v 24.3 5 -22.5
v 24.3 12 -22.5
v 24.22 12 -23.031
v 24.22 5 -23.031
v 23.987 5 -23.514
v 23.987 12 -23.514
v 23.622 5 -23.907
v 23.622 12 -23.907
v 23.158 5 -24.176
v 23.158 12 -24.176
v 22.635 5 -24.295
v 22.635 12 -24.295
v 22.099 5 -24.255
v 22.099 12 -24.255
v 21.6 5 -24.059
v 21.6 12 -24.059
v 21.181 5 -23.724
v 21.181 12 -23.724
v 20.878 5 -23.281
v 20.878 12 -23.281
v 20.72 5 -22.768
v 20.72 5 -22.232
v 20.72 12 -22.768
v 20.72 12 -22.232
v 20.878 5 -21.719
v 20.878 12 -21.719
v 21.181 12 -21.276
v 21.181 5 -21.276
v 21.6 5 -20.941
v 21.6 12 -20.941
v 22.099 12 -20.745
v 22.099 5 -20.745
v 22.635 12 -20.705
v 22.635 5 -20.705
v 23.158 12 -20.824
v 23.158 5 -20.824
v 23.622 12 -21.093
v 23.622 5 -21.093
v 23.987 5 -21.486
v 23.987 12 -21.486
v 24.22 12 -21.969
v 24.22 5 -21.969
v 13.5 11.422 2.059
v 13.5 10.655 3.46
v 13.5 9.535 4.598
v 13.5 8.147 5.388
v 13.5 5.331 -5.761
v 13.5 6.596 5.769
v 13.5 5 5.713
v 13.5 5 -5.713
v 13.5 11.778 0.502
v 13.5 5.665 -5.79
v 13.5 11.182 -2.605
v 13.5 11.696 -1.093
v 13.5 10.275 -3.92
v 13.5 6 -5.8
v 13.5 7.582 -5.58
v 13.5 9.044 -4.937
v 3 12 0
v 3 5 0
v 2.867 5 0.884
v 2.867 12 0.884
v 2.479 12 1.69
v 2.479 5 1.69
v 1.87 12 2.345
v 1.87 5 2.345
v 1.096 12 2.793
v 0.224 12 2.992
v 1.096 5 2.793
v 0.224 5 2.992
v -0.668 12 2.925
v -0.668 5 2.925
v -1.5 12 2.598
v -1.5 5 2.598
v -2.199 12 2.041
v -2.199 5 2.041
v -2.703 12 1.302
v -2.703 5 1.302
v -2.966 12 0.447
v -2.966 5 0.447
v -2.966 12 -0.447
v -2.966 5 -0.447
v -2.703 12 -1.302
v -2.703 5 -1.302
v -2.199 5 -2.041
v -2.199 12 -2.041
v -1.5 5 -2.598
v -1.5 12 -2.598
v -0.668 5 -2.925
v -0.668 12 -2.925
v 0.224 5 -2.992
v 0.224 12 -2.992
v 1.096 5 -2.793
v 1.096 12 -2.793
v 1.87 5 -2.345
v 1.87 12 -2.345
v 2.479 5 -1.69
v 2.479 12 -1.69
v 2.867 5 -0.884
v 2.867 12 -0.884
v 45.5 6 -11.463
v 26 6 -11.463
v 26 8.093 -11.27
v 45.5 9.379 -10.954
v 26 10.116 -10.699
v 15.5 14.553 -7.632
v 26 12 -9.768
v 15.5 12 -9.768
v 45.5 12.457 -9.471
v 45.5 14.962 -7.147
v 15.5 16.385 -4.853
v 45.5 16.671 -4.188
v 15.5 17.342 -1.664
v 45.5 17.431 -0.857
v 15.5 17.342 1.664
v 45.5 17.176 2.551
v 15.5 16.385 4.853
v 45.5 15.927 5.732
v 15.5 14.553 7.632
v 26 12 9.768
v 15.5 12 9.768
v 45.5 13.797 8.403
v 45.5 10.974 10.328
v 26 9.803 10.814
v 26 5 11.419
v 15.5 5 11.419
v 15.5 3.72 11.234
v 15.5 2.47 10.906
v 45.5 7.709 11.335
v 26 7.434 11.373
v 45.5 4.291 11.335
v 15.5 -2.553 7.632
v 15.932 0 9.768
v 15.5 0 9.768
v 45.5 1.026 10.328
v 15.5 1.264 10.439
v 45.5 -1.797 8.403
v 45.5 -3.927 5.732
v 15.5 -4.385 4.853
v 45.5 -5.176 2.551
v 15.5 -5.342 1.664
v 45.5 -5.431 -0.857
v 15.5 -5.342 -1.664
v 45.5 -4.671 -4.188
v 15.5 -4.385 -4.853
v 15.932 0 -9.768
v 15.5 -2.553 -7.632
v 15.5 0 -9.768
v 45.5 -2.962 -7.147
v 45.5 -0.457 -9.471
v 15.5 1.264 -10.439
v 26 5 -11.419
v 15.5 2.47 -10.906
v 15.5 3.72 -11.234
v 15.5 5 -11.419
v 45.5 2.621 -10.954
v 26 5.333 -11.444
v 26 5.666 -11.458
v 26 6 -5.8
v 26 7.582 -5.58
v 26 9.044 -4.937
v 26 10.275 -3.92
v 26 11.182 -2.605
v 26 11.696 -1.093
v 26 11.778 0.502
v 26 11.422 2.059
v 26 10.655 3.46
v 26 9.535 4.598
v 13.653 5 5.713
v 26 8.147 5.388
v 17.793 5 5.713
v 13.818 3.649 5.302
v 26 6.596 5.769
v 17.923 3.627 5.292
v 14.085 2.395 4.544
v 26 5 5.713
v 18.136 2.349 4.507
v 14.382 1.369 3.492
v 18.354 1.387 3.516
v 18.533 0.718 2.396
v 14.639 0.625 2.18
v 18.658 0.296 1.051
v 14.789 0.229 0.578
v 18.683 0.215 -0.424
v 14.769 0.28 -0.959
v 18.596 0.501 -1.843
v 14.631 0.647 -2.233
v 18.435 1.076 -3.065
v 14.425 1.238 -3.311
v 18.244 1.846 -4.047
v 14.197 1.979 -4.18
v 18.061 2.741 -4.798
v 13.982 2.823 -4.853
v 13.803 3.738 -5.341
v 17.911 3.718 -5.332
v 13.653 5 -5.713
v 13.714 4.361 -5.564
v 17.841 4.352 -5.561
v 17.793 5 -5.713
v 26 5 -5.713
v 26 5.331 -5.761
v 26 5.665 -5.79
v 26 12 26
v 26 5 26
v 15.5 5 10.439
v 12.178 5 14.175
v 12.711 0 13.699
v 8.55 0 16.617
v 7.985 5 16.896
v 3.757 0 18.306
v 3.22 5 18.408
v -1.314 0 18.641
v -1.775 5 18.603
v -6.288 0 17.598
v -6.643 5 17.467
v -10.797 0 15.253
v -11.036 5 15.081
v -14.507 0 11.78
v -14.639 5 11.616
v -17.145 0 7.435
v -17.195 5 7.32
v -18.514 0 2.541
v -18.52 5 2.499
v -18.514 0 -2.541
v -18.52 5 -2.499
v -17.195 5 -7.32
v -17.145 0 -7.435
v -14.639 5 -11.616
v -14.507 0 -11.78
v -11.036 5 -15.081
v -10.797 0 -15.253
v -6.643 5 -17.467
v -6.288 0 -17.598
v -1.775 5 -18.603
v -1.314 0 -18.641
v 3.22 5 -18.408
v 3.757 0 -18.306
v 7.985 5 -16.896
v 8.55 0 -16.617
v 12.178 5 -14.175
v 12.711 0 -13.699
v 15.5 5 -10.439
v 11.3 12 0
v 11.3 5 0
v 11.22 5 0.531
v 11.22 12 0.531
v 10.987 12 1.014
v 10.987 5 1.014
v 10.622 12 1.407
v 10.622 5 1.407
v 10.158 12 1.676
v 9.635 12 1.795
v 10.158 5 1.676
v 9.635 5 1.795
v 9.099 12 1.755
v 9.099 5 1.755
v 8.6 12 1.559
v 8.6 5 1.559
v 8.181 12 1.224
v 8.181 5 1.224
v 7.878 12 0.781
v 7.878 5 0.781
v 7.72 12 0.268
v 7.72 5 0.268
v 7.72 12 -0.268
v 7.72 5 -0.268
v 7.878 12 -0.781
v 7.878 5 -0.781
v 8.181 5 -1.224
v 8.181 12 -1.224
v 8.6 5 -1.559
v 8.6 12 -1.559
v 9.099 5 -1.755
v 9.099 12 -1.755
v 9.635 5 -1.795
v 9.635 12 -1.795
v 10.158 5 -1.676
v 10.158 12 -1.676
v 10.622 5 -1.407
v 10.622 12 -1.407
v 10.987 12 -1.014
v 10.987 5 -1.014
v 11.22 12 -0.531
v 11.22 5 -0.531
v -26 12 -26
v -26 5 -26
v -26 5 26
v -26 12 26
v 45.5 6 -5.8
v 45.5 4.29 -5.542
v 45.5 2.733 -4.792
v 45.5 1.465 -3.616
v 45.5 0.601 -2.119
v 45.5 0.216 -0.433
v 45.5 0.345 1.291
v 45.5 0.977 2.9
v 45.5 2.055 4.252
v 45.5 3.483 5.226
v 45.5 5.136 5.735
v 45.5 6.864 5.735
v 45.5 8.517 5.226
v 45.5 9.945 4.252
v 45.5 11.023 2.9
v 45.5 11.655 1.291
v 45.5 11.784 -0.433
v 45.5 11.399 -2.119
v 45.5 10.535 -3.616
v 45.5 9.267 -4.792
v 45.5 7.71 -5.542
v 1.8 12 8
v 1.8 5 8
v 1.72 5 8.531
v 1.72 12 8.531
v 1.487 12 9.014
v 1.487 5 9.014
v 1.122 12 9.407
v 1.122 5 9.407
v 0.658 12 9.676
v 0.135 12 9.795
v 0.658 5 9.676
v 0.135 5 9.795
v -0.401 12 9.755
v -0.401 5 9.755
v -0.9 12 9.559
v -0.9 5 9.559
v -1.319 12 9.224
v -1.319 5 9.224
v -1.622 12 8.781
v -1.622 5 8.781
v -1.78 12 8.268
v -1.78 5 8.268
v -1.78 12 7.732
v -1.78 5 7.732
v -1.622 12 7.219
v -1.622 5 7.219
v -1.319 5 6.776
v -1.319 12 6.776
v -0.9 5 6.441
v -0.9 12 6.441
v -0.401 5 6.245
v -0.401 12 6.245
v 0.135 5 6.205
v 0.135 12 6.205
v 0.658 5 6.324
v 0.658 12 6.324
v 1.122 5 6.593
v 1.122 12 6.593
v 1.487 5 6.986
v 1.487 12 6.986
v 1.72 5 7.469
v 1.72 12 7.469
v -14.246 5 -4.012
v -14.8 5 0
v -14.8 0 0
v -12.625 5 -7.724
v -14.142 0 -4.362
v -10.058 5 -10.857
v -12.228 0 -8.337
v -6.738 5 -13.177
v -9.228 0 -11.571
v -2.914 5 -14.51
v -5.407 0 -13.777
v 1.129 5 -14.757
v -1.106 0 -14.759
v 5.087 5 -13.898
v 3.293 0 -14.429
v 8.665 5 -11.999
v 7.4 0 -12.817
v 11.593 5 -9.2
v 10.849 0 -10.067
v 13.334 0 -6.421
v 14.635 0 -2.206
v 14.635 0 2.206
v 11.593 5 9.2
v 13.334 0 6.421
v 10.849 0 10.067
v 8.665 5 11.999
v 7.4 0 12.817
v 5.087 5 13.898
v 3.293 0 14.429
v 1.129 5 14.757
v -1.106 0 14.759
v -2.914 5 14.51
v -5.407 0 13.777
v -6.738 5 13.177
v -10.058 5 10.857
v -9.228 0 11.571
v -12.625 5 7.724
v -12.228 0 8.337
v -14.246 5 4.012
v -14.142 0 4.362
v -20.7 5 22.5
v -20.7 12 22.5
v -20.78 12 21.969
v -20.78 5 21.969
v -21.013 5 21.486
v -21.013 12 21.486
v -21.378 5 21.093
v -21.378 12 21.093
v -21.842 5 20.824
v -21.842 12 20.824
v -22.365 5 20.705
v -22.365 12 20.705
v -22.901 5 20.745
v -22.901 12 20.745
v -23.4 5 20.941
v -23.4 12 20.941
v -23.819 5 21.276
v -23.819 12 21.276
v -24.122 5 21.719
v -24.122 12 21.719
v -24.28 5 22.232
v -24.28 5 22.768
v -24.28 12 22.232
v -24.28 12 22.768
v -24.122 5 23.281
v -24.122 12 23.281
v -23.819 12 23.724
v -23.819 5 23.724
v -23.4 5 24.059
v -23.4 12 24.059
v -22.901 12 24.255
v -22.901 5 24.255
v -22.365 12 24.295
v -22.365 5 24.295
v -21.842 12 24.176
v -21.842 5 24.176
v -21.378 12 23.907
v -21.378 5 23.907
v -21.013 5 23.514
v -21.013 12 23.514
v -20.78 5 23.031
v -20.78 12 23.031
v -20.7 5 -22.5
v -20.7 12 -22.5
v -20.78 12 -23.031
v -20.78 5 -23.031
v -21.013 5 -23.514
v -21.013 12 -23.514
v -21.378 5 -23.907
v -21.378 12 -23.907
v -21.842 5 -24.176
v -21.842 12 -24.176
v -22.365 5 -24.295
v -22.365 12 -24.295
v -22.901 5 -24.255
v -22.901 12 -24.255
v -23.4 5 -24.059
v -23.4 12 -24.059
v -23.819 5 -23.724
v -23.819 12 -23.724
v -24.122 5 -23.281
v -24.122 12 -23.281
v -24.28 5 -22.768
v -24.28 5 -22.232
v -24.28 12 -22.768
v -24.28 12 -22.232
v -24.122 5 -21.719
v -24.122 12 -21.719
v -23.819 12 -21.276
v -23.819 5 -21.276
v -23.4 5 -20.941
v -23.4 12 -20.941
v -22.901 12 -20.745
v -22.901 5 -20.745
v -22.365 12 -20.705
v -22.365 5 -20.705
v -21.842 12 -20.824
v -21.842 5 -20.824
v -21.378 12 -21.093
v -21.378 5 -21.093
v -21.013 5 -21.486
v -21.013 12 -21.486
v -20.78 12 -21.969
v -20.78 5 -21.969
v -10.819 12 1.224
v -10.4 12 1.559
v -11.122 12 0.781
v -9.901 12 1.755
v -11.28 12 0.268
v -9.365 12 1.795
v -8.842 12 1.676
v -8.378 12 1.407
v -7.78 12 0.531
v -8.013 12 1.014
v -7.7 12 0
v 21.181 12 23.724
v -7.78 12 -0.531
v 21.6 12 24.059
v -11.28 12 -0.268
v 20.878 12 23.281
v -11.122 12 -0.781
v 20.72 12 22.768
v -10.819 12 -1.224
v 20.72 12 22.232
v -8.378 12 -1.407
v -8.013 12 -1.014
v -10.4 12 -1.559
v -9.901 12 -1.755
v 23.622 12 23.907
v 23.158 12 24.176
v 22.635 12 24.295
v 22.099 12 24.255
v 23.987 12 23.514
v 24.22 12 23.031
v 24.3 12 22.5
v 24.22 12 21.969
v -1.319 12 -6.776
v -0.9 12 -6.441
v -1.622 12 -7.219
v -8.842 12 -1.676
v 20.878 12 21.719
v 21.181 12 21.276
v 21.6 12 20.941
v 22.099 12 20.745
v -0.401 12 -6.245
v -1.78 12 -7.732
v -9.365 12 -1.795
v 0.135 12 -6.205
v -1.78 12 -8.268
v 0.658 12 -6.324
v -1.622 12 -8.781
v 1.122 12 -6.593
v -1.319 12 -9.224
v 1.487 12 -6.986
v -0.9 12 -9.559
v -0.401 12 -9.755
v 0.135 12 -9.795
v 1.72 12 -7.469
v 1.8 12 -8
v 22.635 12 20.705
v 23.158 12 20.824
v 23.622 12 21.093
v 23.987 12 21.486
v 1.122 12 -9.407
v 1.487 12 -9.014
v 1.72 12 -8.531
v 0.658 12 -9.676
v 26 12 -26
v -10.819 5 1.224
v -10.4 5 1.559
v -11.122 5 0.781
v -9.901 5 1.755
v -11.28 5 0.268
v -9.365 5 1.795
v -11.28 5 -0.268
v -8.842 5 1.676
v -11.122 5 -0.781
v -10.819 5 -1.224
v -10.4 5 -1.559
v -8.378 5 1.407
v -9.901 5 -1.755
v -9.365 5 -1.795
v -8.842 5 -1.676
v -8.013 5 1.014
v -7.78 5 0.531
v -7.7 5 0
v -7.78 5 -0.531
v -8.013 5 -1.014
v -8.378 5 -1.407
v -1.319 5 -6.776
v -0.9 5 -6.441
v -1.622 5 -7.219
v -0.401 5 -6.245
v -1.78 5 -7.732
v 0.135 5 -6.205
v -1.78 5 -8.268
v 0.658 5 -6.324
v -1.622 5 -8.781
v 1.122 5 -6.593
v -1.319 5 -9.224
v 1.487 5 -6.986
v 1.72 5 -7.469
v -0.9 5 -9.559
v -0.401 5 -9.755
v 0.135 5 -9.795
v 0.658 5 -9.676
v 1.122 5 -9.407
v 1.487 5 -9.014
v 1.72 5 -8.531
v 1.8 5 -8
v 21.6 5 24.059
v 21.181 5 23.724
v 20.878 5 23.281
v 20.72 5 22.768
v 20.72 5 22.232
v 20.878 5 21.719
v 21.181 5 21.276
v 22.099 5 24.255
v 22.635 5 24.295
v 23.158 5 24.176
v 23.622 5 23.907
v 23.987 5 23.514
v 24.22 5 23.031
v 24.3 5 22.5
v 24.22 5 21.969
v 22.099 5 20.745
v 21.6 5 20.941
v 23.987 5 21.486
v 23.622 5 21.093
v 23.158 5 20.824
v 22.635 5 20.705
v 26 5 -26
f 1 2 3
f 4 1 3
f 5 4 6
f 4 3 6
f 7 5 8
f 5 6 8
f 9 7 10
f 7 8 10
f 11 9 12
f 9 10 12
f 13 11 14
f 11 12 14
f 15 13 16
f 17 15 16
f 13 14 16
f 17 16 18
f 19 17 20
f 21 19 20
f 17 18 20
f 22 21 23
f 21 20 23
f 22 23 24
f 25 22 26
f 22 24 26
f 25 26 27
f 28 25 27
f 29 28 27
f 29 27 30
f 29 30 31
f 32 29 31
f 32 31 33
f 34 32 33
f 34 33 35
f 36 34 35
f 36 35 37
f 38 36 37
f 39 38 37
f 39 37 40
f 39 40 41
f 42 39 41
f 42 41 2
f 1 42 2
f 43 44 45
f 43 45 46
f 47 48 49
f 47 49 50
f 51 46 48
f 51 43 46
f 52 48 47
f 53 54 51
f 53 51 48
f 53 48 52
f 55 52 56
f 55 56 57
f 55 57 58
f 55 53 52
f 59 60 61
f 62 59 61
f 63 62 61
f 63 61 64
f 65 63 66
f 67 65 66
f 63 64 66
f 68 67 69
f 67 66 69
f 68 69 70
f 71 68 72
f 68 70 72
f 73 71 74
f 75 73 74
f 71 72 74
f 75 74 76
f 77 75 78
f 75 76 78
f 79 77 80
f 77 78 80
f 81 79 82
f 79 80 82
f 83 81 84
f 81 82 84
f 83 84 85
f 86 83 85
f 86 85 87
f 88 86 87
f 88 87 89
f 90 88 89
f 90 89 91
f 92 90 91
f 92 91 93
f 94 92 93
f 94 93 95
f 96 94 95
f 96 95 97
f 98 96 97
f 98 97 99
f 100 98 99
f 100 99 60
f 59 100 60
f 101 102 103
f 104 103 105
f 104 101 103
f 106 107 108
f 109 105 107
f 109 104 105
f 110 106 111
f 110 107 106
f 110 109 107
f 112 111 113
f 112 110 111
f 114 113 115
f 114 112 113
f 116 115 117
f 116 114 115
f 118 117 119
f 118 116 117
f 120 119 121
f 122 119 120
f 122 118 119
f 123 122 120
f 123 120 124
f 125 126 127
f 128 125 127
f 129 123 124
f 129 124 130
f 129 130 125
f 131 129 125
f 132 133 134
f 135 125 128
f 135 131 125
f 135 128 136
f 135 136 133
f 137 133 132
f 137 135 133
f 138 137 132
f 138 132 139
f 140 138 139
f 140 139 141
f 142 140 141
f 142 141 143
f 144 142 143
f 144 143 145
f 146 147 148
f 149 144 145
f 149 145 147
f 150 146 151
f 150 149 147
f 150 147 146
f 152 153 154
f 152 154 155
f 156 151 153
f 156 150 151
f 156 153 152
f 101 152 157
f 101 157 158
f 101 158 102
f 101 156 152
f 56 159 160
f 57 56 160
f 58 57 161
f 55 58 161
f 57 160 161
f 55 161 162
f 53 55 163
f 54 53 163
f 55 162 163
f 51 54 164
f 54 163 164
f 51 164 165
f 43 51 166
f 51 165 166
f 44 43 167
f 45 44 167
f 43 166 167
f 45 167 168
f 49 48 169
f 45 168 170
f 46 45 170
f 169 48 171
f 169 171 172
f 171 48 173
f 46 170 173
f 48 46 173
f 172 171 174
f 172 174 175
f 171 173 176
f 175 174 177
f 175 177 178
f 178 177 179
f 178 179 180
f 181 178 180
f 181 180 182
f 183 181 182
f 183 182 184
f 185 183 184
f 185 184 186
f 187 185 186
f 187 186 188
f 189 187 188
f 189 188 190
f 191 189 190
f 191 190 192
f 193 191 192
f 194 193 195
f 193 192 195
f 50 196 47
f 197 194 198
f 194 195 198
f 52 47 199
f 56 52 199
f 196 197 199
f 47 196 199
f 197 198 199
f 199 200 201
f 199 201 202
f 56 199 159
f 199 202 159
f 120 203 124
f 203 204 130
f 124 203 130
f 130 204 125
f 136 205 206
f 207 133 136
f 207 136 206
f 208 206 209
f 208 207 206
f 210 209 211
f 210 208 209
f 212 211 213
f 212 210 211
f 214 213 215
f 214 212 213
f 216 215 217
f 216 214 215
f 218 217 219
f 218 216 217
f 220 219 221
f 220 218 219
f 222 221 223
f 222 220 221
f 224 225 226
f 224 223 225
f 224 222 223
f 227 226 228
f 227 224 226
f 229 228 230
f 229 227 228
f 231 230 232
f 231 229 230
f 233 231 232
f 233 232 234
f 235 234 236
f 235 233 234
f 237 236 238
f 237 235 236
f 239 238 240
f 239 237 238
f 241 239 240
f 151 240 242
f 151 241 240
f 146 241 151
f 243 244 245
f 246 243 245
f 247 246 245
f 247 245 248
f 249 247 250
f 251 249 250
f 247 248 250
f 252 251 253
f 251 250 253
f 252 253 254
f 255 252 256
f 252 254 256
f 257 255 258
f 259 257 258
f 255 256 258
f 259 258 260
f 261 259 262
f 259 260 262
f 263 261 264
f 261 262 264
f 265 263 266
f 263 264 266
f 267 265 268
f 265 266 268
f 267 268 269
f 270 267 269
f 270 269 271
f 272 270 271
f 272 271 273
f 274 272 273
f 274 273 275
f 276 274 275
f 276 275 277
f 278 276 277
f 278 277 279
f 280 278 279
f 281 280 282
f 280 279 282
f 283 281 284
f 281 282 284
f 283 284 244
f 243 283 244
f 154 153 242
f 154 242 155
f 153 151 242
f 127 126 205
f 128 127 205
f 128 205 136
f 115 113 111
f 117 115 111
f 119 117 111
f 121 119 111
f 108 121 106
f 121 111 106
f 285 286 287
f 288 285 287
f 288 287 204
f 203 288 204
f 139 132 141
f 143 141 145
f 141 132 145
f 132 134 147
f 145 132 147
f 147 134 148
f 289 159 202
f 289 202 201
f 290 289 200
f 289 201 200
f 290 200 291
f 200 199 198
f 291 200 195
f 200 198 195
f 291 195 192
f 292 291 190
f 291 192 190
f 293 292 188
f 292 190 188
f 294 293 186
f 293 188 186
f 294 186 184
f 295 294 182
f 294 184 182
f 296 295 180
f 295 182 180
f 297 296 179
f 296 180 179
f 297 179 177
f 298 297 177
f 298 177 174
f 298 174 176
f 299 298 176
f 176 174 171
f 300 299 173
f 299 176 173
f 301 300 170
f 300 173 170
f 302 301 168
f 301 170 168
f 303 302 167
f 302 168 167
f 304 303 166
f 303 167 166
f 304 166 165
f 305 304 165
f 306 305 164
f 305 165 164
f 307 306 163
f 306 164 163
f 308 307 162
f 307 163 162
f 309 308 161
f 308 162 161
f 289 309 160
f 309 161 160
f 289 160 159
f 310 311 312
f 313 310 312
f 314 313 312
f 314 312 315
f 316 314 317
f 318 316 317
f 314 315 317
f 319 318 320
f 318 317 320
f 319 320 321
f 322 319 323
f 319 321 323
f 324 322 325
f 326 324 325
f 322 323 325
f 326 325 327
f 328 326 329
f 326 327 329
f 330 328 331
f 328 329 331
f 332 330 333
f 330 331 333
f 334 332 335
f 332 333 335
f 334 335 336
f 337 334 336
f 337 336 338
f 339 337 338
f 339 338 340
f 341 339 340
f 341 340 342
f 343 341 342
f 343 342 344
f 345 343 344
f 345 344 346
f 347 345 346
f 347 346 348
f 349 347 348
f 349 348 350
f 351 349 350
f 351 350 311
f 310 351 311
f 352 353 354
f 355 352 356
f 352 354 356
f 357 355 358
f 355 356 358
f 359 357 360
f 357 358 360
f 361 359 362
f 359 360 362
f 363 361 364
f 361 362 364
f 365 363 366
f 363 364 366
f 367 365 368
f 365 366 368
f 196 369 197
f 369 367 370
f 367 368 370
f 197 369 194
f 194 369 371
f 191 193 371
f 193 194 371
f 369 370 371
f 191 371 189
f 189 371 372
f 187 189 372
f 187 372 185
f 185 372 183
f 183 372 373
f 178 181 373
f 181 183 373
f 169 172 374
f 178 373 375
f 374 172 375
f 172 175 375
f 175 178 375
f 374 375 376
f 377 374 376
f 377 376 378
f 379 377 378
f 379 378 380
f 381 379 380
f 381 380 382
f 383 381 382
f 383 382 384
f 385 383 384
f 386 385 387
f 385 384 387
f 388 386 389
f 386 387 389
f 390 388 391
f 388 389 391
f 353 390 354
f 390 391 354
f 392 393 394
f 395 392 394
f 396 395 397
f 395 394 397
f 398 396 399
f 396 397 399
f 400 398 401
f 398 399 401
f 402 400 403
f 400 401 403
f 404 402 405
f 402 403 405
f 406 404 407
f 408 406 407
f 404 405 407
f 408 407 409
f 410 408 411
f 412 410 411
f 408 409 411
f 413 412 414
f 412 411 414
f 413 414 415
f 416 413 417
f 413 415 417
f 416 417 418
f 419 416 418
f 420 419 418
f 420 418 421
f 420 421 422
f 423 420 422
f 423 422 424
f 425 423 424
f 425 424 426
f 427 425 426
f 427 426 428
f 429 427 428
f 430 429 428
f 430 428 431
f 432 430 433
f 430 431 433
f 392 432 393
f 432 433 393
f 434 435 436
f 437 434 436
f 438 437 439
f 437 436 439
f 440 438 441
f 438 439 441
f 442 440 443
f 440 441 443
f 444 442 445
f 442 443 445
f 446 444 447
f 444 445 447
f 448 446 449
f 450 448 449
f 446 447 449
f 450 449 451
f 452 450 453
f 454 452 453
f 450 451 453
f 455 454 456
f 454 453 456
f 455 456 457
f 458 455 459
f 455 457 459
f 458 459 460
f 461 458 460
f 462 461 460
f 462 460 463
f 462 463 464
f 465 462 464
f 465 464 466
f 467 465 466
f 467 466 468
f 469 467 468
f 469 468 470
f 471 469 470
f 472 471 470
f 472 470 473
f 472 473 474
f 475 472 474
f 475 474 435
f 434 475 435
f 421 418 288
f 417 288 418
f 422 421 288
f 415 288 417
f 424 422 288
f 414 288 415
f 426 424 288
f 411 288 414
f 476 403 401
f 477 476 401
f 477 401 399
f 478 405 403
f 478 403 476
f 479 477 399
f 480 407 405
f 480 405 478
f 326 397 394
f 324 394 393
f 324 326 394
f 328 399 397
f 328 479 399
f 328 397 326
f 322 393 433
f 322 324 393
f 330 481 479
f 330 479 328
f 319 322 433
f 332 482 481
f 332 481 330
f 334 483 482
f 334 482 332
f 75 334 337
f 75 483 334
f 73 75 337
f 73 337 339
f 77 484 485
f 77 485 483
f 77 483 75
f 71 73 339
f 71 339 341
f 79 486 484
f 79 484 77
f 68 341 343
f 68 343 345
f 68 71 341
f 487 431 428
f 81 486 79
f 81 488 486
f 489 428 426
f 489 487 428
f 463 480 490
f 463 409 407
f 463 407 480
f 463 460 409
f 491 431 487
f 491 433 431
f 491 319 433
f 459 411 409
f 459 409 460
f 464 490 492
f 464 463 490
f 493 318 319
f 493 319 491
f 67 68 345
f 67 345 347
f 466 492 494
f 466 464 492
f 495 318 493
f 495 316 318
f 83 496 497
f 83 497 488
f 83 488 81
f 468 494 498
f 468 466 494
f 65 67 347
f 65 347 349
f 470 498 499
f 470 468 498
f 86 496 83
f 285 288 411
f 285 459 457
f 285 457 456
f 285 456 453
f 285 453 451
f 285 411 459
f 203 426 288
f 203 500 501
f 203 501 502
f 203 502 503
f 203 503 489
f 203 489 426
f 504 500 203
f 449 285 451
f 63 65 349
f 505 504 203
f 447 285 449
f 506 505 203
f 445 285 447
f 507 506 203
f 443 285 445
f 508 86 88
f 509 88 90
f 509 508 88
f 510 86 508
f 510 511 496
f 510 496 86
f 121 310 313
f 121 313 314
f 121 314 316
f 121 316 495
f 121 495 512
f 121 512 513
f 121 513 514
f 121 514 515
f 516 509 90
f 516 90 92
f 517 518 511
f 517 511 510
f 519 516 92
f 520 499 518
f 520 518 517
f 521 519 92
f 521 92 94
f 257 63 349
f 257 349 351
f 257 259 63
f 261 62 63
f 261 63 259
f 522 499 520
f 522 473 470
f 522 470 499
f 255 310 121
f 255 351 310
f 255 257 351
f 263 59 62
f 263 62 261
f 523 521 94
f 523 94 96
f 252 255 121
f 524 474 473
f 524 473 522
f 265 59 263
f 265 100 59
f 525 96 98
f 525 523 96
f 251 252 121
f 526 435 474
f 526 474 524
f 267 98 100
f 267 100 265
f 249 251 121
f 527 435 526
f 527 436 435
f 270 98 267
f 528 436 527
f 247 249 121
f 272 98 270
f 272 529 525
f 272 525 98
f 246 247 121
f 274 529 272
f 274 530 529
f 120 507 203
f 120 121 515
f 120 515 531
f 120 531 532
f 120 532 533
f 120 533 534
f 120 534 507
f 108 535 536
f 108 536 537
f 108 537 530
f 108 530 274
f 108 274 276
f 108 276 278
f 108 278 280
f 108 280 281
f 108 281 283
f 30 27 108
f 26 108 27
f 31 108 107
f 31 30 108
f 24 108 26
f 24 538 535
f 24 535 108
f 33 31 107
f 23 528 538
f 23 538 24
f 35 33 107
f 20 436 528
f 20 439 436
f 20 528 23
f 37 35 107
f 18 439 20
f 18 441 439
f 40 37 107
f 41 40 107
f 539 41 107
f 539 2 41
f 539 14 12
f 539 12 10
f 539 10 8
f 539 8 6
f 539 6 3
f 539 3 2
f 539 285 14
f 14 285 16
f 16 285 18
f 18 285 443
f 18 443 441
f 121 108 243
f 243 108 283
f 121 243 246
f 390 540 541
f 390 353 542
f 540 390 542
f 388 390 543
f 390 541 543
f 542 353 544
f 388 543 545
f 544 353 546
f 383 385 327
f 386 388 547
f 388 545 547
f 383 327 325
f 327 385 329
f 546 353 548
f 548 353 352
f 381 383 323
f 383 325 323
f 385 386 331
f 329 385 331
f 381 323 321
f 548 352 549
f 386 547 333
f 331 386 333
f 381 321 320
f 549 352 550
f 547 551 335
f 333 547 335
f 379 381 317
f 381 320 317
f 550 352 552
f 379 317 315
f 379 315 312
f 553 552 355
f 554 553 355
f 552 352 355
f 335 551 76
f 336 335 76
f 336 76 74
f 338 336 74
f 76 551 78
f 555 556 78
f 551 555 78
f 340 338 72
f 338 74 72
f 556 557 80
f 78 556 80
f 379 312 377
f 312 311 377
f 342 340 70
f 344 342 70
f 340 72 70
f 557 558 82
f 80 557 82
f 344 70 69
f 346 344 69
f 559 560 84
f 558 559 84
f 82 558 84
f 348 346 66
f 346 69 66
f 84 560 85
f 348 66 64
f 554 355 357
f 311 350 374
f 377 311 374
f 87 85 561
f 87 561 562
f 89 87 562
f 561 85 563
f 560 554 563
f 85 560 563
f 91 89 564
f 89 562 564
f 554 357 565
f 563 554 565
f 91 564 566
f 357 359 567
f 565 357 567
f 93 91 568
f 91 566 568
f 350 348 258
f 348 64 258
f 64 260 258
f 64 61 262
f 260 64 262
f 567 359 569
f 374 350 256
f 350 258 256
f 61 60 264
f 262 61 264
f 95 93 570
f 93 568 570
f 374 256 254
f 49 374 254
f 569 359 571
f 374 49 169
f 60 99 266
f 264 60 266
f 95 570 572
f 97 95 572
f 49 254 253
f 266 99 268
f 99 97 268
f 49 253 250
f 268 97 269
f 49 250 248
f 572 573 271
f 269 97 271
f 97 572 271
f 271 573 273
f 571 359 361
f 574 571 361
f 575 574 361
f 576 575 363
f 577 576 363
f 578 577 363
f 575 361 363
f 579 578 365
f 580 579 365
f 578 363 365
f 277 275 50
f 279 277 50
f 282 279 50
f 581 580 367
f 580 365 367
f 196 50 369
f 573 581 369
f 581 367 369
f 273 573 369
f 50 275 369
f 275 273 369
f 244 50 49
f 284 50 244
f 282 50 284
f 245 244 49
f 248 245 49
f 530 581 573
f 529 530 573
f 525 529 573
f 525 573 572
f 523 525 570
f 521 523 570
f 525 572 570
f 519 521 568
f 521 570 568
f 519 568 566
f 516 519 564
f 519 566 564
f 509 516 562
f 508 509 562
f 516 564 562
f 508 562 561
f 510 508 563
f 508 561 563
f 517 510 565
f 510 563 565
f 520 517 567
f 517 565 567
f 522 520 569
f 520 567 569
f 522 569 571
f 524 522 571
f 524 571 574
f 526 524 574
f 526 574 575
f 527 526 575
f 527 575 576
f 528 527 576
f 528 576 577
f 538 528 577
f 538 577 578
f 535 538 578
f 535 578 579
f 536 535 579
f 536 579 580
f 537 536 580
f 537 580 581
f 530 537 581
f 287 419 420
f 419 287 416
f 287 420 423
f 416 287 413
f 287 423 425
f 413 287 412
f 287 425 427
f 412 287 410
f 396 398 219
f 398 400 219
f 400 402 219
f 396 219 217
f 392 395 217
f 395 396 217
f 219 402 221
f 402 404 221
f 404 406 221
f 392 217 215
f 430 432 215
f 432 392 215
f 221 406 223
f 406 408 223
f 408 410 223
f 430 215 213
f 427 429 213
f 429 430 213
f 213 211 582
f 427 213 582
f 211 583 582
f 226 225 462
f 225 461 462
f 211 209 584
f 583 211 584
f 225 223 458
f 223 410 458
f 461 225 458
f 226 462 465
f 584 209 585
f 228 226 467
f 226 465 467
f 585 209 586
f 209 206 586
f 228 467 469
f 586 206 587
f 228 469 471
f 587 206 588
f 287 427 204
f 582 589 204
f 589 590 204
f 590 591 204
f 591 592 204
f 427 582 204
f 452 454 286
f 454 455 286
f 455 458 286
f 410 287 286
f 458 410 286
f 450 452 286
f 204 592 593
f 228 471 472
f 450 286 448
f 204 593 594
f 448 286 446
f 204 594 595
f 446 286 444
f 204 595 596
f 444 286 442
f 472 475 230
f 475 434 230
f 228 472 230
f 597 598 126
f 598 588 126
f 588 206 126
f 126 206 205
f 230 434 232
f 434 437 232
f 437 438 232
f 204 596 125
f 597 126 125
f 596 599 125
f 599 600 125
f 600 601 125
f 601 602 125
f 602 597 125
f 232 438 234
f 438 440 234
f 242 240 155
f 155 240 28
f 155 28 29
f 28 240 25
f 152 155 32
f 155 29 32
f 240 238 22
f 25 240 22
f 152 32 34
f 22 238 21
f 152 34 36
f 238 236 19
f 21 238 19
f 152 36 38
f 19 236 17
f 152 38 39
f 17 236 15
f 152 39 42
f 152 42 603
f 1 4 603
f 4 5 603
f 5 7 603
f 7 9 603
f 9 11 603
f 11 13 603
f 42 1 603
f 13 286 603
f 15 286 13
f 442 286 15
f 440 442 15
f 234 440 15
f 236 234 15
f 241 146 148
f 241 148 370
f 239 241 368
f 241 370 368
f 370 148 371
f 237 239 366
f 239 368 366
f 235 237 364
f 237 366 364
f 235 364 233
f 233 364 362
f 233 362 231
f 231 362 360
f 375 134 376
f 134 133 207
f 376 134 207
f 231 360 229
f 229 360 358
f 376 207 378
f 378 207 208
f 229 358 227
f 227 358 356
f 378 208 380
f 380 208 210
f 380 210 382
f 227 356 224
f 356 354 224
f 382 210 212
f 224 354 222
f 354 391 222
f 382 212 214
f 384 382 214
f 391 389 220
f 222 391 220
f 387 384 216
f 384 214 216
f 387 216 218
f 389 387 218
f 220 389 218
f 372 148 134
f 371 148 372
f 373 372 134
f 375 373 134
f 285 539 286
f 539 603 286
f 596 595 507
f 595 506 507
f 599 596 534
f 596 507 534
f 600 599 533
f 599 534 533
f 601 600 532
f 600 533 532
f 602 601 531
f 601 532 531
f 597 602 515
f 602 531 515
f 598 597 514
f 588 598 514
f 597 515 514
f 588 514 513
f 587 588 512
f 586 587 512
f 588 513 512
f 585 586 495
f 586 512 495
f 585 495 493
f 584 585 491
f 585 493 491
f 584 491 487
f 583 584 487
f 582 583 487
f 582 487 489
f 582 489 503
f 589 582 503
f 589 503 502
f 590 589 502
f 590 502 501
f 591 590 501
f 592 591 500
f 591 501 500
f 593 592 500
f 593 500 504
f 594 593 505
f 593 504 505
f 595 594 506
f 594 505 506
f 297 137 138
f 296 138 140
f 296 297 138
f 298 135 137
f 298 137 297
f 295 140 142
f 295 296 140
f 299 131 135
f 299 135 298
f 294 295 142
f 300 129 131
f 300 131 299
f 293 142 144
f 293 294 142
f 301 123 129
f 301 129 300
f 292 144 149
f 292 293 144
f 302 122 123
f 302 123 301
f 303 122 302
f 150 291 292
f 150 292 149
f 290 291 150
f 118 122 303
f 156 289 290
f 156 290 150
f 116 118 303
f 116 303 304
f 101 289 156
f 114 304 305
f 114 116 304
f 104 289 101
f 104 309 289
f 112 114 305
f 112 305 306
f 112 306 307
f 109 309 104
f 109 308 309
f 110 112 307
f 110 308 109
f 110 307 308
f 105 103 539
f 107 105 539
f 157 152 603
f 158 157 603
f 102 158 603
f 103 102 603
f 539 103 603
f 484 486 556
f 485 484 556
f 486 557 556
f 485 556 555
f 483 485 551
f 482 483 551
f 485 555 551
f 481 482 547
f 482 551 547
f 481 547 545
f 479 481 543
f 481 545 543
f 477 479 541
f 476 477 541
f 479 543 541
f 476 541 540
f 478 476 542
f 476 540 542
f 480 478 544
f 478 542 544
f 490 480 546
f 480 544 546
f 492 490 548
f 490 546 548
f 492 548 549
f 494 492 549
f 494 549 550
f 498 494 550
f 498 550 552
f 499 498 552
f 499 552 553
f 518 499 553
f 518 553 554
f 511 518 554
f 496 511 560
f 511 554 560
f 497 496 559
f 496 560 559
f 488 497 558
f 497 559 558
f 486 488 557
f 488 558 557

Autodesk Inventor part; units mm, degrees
ref_plane "YZ Plane" through (0, 0, 0) normal (1, 0, 0) x (0, 1, 0)
ref_plane "XZ Plane" through (0, 0, 0) normal (0, 1, 0) x (-1, 0, 0)
ref_plane "XY Plane" through (0, 0, 0) normal (0, 0, 1) x (1, 0, 0)
sketch "Sketch1" plane through (0, 0, 0) normal (0, 1, 0) x (-1, 0, 0)
  circle A0 centre (0, 0) radius 14.8
  circle A1 centre (0, 0) radius 18.6876
  dimension "d0" = 29.6
extrude "Extrusion1" add sketch "Sketch1" along normal blind 5
sketch "Sketch2" plane through (0, 5, 0) normal (0, 1, 0) x (1, 0, 0)
  line L0 (0, 0) -> (0, 26)
  line L1 (0, 26) -> (-26, 26)
  line L2 (-26, 26) -> (-26, -26)
  line L3 (-26, -26) -> (26, -26)
  line L4 (26, -26) -> (26, 26)
  line L5 (26, 26) -> (-26, 26)
  line L6 (-26, 26) -> (-26, -26)
  dimension "d3" = 26
  dimension "d4" = 26
  dimension "d5" = 52
  dimension "d6" = 52
extrude "Extrusion2" add sketch "Sketch2" along normal blind 7
sketch "Sketch3" plane through (0, 5, 0) normal (0, -1, 0) x (1, 0, 0)
  circle A0 centre (9.5, 0) radius 1.8
  circle A1 centre (-9.5, 0) radius 1.8
  circle A2 centre (0, -8) radius 1.8
  circle A3 centre (0, 8) radius 1.8
  circle A4 centre (0, 0) radius 3
  dimension "d11" = 3.6
  dimension "d12" = 3.6
  dimension "d13" = 3.6
  dimension "d14" = 3.6
  dimension "d15" = 6
extrude "Extrusion3" cut sketch "Sketch3" against normal blind 15
sketch "Sketch4" plane through (26, 5, 26) normal (1, 0, 0) x (0, 0, -1)
  line L0 (52, 0) -> (0, 0) projected
  line L1 (26, 0) -> (26, 1)
  circle A0 centre (26, 1) radius 5.8
  circle A1 centre (26, 1) radius 11.4632
  point P0 (26, -5)
  dimension "d18" = 1
  dimension "d19" = 11.6
extrude "Extrusion4" add sketch "Sketch4" along normal blind 19.5 and the other way blind 10.5 contours A1 L0 A0 | L0 A0 A1
sketch "Sketch5" plane through (45.5, 6, 0) normal (1, 0, 0) x (0, 0, -1)
  circle A0 centre (0, 0) radius 5.8 projected
  circle A1 centre (0, 0) radius 5.8
  point P0 (0, -6)
extrude "Extrusion5" cut sketch "Sketch5" against normal blind 32
sketch "Sketch6" plane through (0, 12, 0) normal (0, 1, 0) x (1, 0, 0)
  line L0 (0, 0) -> (0, 22.5)
  line L1 (0, 22.5) -> (-22.5, 22.5)
  line L2 (-22.5, 22.5) -> (-22.5, -22.5)
  line L3 (-22.5, -22.5) -> (22.5, -22.5)
  line L4 (22.5, -22.5) -> (22.5, 22.5)
  circle A0 centre (-22.5, 22.5) radius 1.8
  circle A1 centre (22.5, 22.5) radius 1.8
  circle A2 centre (-22.5, -22.5) radius 1.8
  circle A3 centre (22.5, -22.5) radius 1.8
  dimension "d26" = 22.5
  dimension "d27" = 22.5
  dimension "d28" = 45
  dimension "d29" = 45
  dimension "d30" = 3.6
  dimension "d31" = 3.6
  dimension "d32" = 3.6
  dimension "d33" = 3.6
extrude "Extrusion6" cut sketch "Sketch6" against normal blind 32
properties part number "NewGimbalPart4" material "Brass, Soft Yellow, Welded"
